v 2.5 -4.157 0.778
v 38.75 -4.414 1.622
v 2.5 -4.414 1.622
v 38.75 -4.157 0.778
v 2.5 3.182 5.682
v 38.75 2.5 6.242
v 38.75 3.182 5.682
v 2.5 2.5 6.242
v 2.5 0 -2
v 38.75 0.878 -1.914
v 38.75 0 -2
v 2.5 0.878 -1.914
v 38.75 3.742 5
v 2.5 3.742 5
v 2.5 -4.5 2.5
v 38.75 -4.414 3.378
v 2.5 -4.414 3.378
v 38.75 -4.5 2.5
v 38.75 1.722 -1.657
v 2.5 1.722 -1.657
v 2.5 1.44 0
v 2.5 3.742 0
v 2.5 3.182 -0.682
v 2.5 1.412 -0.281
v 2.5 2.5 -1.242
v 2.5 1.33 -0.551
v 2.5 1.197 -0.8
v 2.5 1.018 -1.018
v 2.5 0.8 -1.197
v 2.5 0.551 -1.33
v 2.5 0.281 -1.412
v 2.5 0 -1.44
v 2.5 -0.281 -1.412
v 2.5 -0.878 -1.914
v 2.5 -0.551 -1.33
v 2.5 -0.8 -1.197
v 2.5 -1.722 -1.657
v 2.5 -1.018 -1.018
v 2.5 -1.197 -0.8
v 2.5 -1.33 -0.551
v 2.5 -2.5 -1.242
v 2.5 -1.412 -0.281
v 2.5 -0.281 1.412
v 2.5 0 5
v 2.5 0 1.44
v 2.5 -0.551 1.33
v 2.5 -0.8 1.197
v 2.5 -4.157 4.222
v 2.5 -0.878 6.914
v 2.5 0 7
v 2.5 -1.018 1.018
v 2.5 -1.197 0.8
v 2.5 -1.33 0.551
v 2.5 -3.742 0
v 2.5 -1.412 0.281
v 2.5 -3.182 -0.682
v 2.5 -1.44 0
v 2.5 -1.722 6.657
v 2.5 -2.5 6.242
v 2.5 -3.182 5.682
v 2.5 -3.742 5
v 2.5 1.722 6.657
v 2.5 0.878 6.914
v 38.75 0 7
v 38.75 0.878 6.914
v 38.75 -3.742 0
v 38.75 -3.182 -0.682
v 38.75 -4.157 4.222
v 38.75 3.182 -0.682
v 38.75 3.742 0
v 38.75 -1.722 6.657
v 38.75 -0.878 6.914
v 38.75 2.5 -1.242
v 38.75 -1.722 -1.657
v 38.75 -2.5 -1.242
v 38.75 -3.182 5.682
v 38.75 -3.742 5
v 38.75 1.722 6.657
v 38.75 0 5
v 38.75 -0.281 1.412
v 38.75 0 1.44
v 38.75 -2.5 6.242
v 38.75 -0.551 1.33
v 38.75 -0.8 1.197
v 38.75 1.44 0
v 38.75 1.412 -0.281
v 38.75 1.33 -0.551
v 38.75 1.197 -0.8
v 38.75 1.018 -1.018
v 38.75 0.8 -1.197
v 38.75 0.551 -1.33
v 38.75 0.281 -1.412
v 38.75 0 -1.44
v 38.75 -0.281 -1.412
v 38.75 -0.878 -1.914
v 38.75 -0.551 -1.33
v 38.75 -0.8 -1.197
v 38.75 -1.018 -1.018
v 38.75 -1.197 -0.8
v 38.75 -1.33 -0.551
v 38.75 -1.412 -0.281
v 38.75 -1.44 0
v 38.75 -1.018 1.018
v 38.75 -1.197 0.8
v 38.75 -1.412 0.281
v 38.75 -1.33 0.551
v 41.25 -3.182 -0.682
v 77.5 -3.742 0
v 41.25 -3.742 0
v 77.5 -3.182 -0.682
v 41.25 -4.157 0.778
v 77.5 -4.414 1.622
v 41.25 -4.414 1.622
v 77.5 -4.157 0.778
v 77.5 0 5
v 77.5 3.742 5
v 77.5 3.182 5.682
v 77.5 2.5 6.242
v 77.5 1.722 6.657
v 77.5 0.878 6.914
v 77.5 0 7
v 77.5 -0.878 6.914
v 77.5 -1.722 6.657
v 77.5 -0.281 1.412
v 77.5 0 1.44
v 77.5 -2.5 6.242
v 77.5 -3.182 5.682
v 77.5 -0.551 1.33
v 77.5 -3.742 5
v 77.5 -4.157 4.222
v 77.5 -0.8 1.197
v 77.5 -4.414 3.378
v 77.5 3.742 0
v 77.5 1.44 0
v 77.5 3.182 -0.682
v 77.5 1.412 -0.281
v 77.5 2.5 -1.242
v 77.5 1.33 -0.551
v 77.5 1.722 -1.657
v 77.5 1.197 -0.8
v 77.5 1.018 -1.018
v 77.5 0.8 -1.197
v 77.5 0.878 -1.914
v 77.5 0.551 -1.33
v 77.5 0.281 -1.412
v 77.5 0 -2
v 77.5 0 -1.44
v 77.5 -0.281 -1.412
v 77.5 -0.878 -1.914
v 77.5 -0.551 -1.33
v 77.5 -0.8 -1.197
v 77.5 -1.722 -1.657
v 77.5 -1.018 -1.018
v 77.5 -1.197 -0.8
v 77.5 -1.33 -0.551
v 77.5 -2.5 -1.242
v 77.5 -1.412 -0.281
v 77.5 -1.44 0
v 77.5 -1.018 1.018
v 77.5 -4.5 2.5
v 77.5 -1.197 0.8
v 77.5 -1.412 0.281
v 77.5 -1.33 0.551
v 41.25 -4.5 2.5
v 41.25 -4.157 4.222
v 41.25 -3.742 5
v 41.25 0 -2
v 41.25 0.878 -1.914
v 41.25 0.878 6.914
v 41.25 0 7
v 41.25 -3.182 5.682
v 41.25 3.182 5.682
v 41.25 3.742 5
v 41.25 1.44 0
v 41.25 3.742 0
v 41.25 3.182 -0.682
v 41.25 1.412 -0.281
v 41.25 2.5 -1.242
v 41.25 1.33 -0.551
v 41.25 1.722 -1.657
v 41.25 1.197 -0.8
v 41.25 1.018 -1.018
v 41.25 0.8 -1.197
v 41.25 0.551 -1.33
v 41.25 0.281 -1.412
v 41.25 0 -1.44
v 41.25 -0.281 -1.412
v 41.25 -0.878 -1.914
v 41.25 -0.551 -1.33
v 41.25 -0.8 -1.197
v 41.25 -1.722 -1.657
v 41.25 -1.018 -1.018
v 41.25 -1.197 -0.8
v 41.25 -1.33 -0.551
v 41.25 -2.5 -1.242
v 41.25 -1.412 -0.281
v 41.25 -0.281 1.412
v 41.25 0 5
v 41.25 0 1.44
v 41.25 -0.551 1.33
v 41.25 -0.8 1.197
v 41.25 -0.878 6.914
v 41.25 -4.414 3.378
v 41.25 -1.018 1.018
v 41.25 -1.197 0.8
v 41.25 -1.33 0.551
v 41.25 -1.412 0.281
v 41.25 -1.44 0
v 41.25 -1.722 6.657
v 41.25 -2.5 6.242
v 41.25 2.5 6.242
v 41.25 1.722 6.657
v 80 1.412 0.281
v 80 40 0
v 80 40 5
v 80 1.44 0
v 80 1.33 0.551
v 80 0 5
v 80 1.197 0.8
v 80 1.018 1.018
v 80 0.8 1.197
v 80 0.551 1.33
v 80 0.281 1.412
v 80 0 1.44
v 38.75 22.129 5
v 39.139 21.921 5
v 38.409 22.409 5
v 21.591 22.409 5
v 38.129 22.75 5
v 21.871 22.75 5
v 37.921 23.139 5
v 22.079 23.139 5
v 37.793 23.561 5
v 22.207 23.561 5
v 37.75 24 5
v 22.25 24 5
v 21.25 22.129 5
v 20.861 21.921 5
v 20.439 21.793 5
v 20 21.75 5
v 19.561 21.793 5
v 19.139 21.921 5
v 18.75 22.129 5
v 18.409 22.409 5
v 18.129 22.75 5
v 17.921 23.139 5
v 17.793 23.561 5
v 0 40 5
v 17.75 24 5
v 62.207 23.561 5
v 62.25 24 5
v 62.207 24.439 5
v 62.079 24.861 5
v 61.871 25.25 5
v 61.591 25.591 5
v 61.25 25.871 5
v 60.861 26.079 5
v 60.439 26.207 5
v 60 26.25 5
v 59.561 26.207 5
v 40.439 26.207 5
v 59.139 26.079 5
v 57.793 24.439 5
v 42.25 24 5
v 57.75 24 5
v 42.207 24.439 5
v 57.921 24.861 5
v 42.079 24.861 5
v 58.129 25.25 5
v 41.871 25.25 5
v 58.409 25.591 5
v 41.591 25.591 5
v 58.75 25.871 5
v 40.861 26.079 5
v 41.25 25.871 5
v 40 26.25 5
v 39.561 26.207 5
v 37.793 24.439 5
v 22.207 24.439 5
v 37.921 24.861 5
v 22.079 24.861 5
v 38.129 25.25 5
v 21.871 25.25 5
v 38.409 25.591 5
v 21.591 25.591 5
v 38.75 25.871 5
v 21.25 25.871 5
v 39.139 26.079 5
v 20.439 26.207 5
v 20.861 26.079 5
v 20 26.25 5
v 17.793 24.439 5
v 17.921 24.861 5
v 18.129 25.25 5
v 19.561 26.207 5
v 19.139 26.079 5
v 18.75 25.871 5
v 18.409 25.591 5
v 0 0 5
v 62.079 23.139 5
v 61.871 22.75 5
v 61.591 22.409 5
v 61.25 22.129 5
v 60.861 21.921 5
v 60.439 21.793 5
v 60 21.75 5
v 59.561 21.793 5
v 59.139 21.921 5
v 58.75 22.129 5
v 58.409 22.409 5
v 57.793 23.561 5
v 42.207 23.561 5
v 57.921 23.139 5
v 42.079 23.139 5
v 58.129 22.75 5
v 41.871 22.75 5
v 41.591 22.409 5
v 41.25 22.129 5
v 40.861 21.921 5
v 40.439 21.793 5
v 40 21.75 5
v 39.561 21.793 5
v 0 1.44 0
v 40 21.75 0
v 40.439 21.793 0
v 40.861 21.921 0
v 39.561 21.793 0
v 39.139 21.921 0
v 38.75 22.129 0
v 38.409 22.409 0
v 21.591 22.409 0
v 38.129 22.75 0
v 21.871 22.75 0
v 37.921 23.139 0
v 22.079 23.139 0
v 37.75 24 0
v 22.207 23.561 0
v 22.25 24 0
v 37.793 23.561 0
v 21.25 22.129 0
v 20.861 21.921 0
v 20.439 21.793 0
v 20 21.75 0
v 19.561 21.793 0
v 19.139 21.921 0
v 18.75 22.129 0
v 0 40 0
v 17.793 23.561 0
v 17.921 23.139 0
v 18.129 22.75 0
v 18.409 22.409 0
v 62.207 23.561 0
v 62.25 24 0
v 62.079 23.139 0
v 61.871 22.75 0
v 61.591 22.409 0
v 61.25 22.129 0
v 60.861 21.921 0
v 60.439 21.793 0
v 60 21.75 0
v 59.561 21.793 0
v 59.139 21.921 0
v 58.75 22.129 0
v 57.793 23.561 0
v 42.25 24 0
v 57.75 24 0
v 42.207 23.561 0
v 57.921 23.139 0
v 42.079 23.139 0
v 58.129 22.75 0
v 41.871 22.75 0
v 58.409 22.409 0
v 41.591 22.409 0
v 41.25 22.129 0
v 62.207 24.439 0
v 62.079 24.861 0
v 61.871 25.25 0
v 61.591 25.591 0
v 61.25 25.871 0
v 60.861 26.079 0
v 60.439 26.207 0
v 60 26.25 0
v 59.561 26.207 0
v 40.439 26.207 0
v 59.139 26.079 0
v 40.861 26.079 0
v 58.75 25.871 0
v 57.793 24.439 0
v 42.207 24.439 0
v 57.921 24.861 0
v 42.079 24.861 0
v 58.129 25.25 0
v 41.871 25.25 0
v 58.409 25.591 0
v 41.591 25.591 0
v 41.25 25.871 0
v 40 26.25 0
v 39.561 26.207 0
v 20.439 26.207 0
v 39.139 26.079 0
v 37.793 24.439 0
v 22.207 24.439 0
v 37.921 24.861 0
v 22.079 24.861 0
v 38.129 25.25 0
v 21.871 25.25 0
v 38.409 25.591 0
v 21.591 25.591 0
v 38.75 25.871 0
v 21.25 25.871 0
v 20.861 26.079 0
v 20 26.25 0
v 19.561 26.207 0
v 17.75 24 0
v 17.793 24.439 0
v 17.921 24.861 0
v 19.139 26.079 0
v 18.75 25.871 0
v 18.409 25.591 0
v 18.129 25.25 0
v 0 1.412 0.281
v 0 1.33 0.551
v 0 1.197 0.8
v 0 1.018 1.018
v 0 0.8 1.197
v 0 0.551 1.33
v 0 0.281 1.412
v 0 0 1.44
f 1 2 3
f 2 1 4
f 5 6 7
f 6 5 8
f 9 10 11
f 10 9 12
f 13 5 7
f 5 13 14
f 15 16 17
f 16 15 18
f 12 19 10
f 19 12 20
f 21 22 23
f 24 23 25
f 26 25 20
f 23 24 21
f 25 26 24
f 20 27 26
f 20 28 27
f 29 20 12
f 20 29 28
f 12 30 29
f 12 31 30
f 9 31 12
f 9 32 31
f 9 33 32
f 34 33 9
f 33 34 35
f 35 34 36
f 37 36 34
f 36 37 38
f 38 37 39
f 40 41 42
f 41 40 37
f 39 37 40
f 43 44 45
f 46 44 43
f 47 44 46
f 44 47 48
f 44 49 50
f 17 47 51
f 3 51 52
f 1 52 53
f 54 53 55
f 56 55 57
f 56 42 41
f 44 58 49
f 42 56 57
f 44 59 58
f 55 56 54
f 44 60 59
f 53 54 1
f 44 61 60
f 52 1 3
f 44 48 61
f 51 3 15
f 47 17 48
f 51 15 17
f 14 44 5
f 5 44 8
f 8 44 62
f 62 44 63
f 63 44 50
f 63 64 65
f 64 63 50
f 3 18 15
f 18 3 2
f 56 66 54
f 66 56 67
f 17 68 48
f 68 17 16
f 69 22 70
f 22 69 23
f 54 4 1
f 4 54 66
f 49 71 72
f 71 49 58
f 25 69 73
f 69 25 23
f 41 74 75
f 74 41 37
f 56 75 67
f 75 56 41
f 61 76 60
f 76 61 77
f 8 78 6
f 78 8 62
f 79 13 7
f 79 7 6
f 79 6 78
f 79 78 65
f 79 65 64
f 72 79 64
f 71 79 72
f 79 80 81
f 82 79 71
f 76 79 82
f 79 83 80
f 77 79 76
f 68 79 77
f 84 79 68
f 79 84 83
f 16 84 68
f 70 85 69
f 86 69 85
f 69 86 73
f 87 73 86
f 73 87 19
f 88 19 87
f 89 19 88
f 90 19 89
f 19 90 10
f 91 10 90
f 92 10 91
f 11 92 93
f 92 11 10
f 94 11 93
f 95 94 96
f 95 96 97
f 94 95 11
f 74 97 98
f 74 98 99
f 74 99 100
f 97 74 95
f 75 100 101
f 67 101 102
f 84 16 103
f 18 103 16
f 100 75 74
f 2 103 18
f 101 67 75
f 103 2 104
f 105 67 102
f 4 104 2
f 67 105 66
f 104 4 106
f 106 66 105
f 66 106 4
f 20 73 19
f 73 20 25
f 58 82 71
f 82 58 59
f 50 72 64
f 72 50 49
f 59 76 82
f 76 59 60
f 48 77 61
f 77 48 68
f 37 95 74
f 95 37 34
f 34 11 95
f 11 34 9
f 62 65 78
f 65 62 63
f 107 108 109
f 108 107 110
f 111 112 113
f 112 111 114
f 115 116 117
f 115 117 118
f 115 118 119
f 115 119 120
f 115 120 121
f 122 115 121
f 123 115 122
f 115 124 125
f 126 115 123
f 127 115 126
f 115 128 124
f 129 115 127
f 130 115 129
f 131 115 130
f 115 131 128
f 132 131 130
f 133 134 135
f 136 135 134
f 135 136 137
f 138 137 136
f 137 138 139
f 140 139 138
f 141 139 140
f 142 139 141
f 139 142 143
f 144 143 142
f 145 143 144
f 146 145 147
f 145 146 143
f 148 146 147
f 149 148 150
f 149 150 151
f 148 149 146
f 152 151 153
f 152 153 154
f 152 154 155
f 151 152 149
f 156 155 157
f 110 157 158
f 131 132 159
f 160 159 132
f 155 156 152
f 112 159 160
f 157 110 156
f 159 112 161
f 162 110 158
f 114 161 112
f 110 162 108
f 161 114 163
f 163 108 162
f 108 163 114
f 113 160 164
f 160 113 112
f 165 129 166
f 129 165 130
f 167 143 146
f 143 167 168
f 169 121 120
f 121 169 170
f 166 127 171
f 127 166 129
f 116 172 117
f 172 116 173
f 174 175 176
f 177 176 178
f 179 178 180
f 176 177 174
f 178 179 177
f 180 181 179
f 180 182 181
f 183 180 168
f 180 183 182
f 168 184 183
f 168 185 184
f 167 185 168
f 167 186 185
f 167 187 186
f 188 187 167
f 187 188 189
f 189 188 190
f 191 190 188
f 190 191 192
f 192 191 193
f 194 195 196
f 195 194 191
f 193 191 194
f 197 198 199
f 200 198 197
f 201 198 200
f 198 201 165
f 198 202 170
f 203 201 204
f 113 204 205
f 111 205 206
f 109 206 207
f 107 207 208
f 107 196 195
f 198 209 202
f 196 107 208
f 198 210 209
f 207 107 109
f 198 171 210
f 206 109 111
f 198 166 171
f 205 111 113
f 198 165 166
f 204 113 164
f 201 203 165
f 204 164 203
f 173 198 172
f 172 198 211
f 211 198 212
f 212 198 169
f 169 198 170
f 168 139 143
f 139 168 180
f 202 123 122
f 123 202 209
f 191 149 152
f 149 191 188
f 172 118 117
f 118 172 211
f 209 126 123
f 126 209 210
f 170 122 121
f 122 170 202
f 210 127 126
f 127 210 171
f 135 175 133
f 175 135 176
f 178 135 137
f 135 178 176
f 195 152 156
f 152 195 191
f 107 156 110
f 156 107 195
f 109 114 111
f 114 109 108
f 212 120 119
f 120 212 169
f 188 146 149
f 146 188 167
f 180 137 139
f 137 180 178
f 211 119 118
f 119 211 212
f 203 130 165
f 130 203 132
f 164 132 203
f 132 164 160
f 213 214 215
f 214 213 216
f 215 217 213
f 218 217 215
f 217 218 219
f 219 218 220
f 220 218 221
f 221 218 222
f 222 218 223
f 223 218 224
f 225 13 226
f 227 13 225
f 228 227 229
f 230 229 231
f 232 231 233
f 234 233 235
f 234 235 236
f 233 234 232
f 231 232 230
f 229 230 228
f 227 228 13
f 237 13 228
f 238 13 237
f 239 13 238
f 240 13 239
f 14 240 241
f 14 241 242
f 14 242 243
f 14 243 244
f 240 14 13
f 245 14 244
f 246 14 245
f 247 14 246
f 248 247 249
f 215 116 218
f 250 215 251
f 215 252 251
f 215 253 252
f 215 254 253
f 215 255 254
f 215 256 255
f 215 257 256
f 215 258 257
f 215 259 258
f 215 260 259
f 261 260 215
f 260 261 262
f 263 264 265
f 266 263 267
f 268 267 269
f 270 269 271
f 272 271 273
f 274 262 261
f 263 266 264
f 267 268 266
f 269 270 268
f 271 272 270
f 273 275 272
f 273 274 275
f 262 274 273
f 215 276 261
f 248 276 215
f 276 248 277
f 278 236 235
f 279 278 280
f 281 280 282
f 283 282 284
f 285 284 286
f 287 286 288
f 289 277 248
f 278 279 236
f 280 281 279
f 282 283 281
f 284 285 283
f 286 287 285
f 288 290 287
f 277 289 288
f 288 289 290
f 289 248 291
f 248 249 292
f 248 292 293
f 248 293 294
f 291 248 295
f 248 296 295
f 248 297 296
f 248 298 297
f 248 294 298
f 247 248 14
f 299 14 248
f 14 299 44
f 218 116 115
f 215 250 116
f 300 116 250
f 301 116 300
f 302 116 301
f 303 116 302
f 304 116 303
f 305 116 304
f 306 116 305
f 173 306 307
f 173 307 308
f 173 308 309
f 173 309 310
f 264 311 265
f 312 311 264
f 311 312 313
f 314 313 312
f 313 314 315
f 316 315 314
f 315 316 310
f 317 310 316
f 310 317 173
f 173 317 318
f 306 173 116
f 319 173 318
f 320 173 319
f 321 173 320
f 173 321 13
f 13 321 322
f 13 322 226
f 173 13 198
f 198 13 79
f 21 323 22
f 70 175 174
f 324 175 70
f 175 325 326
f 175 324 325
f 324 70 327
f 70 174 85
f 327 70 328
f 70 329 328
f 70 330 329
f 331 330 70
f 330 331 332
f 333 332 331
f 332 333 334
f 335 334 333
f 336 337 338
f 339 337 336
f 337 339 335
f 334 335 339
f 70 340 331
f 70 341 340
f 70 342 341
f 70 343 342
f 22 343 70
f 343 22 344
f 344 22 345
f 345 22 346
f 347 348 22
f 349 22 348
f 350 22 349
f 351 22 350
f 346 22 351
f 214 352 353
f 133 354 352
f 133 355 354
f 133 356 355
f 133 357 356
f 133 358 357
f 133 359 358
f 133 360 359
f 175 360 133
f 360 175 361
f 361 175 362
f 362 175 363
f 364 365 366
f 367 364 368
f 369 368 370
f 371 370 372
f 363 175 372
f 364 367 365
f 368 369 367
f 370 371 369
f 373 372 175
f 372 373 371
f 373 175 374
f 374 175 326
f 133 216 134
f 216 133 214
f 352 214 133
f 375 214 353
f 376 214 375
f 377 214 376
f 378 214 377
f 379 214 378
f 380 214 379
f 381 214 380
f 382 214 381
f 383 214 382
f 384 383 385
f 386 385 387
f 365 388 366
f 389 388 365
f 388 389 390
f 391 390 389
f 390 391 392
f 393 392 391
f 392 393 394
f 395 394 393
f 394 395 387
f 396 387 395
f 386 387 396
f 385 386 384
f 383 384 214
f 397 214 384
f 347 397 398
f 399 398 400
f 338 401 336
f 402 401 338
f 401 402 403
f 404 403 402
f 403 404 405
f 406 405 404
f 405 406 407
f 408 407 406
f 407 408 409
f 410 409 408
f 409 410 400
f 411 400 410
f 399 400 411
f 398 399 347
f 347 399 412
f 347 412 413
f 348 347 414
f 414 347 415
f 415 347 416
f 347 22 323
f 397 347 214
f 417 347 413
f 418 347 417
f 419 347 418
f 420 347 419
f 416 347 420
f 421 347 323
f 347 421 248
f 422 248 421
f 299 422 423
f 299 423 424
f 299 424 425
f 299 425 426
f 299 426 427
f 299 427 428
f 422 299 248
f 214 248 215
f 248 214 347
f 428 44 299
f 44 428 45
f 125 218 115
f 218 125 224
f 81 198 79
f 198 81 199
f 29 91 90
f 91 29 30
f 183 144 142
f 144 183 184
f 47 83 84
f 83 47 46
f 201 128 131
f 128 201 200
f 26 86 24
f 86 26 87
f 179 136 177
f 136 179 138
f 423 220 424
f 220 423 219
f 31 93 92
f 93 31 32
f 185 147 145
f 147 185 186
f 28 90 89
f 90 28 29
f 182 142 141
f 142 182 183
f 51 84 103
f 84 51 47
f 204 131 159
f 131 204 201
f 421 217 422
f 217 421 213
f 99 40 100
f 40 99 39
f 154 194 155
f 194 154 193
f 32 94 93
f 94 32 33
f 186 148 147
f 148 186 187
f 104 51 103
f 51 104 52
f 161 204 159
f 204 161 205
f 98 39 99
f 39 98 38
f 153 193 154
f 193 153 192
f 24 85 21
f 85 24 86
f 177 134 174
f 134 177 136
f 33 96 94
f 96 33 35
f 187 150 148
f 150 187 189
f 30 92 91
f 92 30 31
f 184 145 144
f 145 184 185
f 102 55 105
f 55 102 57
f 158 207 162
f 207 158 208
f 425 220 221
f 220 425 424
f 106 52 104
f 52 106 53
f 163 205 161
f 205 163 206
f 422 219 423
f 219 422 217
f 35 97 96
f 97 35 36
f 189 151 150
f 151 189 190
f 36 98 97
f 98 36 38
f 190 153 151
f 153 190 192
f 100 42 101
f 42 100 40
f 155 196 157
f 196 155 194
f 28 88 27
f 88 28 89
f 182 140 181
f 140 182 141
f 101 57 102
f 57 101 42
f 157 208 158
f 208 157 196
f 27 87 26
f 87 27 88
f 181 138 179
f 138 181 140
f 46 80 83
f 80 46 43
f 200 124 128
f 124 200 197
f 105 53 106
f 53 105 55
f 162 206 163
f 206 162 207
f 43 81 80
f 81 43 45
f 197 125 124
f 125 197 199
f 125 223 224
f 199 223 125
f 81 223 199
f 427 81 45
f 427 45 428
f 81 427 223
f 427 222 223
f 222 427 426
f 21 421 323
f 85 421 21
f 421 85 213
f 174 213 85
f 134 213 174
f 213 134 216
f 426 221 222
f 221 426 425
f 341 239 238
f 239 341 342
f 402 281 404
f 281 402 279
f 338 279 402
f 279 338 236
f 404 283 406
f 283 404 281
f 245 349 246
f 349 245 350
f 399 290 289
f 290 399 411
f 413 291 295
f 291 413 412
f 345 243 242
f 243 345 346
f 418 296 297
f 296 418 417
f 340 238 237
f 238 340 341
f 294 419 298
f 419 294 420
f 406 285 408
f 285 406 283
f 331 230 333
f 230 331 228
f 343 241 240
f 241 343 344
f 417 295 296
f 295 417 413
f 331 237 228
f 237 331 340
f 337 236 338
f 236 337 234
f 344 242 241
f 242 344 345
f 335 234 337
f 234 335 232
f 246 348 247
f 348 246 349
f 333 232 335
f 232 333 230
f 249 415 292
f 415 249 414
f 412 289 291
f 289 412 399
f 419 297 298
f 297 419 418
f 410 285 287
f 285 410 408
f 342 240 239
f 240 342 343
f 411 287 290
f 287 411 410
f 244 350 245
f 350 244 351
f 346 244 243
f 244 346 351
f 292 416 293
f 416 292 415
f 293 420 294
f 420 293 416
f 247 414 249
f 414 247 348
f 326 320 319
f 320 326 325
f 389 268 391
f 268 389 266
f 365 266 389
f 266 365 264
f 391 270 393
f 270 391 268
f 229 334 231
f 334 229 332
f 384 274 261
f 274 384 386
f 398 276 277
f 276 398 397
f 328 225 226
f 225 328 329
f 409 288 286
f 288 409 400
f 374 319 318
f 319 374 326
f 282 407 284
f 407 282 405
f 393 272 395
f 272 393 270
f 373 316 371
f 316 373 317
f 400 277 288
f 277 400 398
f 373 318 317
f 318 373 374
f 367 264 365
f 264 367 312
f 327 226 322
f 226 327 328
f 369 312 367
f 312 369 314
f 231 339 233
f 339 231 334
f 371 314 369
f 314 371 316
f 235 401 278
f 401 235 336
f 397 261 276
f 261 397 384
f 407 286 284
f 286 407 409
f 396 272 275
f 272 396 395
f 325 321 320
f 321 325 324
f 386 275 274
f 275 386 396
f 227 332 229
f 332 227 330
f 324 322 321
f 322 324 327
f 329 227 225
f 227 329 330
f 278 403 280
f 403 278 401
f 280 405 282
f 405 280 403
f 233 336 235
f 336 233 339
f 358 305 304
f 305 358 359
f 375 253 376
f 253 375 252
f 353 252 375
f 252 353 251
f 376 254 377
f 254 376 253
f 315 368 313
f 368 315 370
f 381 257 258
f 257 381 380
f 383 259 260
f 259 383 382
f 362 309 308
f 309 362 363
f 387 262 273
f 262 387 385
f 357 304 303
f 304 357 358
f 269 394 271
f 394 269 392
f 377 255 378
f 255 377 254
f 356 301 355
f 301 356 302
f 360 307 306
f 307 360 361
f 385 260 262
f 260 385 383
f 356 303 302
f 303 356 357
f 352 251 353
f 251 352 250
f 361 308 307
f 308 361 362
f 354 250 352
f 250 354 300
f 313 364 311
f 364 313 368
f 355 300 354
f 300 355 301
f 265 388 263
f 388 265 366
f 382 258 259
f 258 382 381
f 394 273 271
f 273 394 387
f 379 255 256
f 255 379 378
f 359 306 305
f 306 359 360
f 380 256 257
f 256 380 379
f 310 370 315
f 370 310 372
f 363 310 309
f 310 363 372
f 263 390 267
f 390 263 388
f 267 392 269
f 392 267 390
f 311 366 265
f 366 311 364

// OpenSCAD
$fn = 32;

// ----------------------------------------------------------------------
// Hinge leaf: 80 x 44.5 x 9 mm
// ----------------------------------------------------------------------

// --- parameters (mm) ---
tab_len = 80;             // leaf length, X
tab_w = 40;               // leaf width, Y
tab_t = 5;                // leaf thickness
ring_d = 9;               // knuckle diameter
ring_w = 36.25;           // knuckle width
knuckle_n = 2;            // number of knuckles
pin_d = 2.88;             // pin bore
gap = 2.5;                // gap between the knuckles
screw_d = 4.5;            // screw clearance

module leaf() {
  cube([tab_len, tab_w, tab_t]);
}

module knuckles() {
  /* barrels sit on the leaf edge, the pin axis at half the leaf thickness */
  for (i = [0 : knuckle_n - 1])
    translate([gap + i * (ring_w + gap), 0, tab_t * 0.5])
      rotate([0, 90, 0]) cylinder(h = ring_w, d = ring_d);
}

difference() {
  union() {
    leaf();
    knuckles();
  }
  rotate([0, 90, 0]) translate([0, 0, -1])
    cylinder(h = tab_len + 2, d = pin_d);
  translate([20, tab_w * 0.6, -1]) cylinder(h = tab_t + 2, d = screw_d);
  translate([40, tab_w * 0.6, -1]) cylinder(h = tab_t + 2, d = screw_d);
  translate([60, tab_w * 0.6, -1]) cylinder(h = tab_t + 2, d = screw_d);
}
